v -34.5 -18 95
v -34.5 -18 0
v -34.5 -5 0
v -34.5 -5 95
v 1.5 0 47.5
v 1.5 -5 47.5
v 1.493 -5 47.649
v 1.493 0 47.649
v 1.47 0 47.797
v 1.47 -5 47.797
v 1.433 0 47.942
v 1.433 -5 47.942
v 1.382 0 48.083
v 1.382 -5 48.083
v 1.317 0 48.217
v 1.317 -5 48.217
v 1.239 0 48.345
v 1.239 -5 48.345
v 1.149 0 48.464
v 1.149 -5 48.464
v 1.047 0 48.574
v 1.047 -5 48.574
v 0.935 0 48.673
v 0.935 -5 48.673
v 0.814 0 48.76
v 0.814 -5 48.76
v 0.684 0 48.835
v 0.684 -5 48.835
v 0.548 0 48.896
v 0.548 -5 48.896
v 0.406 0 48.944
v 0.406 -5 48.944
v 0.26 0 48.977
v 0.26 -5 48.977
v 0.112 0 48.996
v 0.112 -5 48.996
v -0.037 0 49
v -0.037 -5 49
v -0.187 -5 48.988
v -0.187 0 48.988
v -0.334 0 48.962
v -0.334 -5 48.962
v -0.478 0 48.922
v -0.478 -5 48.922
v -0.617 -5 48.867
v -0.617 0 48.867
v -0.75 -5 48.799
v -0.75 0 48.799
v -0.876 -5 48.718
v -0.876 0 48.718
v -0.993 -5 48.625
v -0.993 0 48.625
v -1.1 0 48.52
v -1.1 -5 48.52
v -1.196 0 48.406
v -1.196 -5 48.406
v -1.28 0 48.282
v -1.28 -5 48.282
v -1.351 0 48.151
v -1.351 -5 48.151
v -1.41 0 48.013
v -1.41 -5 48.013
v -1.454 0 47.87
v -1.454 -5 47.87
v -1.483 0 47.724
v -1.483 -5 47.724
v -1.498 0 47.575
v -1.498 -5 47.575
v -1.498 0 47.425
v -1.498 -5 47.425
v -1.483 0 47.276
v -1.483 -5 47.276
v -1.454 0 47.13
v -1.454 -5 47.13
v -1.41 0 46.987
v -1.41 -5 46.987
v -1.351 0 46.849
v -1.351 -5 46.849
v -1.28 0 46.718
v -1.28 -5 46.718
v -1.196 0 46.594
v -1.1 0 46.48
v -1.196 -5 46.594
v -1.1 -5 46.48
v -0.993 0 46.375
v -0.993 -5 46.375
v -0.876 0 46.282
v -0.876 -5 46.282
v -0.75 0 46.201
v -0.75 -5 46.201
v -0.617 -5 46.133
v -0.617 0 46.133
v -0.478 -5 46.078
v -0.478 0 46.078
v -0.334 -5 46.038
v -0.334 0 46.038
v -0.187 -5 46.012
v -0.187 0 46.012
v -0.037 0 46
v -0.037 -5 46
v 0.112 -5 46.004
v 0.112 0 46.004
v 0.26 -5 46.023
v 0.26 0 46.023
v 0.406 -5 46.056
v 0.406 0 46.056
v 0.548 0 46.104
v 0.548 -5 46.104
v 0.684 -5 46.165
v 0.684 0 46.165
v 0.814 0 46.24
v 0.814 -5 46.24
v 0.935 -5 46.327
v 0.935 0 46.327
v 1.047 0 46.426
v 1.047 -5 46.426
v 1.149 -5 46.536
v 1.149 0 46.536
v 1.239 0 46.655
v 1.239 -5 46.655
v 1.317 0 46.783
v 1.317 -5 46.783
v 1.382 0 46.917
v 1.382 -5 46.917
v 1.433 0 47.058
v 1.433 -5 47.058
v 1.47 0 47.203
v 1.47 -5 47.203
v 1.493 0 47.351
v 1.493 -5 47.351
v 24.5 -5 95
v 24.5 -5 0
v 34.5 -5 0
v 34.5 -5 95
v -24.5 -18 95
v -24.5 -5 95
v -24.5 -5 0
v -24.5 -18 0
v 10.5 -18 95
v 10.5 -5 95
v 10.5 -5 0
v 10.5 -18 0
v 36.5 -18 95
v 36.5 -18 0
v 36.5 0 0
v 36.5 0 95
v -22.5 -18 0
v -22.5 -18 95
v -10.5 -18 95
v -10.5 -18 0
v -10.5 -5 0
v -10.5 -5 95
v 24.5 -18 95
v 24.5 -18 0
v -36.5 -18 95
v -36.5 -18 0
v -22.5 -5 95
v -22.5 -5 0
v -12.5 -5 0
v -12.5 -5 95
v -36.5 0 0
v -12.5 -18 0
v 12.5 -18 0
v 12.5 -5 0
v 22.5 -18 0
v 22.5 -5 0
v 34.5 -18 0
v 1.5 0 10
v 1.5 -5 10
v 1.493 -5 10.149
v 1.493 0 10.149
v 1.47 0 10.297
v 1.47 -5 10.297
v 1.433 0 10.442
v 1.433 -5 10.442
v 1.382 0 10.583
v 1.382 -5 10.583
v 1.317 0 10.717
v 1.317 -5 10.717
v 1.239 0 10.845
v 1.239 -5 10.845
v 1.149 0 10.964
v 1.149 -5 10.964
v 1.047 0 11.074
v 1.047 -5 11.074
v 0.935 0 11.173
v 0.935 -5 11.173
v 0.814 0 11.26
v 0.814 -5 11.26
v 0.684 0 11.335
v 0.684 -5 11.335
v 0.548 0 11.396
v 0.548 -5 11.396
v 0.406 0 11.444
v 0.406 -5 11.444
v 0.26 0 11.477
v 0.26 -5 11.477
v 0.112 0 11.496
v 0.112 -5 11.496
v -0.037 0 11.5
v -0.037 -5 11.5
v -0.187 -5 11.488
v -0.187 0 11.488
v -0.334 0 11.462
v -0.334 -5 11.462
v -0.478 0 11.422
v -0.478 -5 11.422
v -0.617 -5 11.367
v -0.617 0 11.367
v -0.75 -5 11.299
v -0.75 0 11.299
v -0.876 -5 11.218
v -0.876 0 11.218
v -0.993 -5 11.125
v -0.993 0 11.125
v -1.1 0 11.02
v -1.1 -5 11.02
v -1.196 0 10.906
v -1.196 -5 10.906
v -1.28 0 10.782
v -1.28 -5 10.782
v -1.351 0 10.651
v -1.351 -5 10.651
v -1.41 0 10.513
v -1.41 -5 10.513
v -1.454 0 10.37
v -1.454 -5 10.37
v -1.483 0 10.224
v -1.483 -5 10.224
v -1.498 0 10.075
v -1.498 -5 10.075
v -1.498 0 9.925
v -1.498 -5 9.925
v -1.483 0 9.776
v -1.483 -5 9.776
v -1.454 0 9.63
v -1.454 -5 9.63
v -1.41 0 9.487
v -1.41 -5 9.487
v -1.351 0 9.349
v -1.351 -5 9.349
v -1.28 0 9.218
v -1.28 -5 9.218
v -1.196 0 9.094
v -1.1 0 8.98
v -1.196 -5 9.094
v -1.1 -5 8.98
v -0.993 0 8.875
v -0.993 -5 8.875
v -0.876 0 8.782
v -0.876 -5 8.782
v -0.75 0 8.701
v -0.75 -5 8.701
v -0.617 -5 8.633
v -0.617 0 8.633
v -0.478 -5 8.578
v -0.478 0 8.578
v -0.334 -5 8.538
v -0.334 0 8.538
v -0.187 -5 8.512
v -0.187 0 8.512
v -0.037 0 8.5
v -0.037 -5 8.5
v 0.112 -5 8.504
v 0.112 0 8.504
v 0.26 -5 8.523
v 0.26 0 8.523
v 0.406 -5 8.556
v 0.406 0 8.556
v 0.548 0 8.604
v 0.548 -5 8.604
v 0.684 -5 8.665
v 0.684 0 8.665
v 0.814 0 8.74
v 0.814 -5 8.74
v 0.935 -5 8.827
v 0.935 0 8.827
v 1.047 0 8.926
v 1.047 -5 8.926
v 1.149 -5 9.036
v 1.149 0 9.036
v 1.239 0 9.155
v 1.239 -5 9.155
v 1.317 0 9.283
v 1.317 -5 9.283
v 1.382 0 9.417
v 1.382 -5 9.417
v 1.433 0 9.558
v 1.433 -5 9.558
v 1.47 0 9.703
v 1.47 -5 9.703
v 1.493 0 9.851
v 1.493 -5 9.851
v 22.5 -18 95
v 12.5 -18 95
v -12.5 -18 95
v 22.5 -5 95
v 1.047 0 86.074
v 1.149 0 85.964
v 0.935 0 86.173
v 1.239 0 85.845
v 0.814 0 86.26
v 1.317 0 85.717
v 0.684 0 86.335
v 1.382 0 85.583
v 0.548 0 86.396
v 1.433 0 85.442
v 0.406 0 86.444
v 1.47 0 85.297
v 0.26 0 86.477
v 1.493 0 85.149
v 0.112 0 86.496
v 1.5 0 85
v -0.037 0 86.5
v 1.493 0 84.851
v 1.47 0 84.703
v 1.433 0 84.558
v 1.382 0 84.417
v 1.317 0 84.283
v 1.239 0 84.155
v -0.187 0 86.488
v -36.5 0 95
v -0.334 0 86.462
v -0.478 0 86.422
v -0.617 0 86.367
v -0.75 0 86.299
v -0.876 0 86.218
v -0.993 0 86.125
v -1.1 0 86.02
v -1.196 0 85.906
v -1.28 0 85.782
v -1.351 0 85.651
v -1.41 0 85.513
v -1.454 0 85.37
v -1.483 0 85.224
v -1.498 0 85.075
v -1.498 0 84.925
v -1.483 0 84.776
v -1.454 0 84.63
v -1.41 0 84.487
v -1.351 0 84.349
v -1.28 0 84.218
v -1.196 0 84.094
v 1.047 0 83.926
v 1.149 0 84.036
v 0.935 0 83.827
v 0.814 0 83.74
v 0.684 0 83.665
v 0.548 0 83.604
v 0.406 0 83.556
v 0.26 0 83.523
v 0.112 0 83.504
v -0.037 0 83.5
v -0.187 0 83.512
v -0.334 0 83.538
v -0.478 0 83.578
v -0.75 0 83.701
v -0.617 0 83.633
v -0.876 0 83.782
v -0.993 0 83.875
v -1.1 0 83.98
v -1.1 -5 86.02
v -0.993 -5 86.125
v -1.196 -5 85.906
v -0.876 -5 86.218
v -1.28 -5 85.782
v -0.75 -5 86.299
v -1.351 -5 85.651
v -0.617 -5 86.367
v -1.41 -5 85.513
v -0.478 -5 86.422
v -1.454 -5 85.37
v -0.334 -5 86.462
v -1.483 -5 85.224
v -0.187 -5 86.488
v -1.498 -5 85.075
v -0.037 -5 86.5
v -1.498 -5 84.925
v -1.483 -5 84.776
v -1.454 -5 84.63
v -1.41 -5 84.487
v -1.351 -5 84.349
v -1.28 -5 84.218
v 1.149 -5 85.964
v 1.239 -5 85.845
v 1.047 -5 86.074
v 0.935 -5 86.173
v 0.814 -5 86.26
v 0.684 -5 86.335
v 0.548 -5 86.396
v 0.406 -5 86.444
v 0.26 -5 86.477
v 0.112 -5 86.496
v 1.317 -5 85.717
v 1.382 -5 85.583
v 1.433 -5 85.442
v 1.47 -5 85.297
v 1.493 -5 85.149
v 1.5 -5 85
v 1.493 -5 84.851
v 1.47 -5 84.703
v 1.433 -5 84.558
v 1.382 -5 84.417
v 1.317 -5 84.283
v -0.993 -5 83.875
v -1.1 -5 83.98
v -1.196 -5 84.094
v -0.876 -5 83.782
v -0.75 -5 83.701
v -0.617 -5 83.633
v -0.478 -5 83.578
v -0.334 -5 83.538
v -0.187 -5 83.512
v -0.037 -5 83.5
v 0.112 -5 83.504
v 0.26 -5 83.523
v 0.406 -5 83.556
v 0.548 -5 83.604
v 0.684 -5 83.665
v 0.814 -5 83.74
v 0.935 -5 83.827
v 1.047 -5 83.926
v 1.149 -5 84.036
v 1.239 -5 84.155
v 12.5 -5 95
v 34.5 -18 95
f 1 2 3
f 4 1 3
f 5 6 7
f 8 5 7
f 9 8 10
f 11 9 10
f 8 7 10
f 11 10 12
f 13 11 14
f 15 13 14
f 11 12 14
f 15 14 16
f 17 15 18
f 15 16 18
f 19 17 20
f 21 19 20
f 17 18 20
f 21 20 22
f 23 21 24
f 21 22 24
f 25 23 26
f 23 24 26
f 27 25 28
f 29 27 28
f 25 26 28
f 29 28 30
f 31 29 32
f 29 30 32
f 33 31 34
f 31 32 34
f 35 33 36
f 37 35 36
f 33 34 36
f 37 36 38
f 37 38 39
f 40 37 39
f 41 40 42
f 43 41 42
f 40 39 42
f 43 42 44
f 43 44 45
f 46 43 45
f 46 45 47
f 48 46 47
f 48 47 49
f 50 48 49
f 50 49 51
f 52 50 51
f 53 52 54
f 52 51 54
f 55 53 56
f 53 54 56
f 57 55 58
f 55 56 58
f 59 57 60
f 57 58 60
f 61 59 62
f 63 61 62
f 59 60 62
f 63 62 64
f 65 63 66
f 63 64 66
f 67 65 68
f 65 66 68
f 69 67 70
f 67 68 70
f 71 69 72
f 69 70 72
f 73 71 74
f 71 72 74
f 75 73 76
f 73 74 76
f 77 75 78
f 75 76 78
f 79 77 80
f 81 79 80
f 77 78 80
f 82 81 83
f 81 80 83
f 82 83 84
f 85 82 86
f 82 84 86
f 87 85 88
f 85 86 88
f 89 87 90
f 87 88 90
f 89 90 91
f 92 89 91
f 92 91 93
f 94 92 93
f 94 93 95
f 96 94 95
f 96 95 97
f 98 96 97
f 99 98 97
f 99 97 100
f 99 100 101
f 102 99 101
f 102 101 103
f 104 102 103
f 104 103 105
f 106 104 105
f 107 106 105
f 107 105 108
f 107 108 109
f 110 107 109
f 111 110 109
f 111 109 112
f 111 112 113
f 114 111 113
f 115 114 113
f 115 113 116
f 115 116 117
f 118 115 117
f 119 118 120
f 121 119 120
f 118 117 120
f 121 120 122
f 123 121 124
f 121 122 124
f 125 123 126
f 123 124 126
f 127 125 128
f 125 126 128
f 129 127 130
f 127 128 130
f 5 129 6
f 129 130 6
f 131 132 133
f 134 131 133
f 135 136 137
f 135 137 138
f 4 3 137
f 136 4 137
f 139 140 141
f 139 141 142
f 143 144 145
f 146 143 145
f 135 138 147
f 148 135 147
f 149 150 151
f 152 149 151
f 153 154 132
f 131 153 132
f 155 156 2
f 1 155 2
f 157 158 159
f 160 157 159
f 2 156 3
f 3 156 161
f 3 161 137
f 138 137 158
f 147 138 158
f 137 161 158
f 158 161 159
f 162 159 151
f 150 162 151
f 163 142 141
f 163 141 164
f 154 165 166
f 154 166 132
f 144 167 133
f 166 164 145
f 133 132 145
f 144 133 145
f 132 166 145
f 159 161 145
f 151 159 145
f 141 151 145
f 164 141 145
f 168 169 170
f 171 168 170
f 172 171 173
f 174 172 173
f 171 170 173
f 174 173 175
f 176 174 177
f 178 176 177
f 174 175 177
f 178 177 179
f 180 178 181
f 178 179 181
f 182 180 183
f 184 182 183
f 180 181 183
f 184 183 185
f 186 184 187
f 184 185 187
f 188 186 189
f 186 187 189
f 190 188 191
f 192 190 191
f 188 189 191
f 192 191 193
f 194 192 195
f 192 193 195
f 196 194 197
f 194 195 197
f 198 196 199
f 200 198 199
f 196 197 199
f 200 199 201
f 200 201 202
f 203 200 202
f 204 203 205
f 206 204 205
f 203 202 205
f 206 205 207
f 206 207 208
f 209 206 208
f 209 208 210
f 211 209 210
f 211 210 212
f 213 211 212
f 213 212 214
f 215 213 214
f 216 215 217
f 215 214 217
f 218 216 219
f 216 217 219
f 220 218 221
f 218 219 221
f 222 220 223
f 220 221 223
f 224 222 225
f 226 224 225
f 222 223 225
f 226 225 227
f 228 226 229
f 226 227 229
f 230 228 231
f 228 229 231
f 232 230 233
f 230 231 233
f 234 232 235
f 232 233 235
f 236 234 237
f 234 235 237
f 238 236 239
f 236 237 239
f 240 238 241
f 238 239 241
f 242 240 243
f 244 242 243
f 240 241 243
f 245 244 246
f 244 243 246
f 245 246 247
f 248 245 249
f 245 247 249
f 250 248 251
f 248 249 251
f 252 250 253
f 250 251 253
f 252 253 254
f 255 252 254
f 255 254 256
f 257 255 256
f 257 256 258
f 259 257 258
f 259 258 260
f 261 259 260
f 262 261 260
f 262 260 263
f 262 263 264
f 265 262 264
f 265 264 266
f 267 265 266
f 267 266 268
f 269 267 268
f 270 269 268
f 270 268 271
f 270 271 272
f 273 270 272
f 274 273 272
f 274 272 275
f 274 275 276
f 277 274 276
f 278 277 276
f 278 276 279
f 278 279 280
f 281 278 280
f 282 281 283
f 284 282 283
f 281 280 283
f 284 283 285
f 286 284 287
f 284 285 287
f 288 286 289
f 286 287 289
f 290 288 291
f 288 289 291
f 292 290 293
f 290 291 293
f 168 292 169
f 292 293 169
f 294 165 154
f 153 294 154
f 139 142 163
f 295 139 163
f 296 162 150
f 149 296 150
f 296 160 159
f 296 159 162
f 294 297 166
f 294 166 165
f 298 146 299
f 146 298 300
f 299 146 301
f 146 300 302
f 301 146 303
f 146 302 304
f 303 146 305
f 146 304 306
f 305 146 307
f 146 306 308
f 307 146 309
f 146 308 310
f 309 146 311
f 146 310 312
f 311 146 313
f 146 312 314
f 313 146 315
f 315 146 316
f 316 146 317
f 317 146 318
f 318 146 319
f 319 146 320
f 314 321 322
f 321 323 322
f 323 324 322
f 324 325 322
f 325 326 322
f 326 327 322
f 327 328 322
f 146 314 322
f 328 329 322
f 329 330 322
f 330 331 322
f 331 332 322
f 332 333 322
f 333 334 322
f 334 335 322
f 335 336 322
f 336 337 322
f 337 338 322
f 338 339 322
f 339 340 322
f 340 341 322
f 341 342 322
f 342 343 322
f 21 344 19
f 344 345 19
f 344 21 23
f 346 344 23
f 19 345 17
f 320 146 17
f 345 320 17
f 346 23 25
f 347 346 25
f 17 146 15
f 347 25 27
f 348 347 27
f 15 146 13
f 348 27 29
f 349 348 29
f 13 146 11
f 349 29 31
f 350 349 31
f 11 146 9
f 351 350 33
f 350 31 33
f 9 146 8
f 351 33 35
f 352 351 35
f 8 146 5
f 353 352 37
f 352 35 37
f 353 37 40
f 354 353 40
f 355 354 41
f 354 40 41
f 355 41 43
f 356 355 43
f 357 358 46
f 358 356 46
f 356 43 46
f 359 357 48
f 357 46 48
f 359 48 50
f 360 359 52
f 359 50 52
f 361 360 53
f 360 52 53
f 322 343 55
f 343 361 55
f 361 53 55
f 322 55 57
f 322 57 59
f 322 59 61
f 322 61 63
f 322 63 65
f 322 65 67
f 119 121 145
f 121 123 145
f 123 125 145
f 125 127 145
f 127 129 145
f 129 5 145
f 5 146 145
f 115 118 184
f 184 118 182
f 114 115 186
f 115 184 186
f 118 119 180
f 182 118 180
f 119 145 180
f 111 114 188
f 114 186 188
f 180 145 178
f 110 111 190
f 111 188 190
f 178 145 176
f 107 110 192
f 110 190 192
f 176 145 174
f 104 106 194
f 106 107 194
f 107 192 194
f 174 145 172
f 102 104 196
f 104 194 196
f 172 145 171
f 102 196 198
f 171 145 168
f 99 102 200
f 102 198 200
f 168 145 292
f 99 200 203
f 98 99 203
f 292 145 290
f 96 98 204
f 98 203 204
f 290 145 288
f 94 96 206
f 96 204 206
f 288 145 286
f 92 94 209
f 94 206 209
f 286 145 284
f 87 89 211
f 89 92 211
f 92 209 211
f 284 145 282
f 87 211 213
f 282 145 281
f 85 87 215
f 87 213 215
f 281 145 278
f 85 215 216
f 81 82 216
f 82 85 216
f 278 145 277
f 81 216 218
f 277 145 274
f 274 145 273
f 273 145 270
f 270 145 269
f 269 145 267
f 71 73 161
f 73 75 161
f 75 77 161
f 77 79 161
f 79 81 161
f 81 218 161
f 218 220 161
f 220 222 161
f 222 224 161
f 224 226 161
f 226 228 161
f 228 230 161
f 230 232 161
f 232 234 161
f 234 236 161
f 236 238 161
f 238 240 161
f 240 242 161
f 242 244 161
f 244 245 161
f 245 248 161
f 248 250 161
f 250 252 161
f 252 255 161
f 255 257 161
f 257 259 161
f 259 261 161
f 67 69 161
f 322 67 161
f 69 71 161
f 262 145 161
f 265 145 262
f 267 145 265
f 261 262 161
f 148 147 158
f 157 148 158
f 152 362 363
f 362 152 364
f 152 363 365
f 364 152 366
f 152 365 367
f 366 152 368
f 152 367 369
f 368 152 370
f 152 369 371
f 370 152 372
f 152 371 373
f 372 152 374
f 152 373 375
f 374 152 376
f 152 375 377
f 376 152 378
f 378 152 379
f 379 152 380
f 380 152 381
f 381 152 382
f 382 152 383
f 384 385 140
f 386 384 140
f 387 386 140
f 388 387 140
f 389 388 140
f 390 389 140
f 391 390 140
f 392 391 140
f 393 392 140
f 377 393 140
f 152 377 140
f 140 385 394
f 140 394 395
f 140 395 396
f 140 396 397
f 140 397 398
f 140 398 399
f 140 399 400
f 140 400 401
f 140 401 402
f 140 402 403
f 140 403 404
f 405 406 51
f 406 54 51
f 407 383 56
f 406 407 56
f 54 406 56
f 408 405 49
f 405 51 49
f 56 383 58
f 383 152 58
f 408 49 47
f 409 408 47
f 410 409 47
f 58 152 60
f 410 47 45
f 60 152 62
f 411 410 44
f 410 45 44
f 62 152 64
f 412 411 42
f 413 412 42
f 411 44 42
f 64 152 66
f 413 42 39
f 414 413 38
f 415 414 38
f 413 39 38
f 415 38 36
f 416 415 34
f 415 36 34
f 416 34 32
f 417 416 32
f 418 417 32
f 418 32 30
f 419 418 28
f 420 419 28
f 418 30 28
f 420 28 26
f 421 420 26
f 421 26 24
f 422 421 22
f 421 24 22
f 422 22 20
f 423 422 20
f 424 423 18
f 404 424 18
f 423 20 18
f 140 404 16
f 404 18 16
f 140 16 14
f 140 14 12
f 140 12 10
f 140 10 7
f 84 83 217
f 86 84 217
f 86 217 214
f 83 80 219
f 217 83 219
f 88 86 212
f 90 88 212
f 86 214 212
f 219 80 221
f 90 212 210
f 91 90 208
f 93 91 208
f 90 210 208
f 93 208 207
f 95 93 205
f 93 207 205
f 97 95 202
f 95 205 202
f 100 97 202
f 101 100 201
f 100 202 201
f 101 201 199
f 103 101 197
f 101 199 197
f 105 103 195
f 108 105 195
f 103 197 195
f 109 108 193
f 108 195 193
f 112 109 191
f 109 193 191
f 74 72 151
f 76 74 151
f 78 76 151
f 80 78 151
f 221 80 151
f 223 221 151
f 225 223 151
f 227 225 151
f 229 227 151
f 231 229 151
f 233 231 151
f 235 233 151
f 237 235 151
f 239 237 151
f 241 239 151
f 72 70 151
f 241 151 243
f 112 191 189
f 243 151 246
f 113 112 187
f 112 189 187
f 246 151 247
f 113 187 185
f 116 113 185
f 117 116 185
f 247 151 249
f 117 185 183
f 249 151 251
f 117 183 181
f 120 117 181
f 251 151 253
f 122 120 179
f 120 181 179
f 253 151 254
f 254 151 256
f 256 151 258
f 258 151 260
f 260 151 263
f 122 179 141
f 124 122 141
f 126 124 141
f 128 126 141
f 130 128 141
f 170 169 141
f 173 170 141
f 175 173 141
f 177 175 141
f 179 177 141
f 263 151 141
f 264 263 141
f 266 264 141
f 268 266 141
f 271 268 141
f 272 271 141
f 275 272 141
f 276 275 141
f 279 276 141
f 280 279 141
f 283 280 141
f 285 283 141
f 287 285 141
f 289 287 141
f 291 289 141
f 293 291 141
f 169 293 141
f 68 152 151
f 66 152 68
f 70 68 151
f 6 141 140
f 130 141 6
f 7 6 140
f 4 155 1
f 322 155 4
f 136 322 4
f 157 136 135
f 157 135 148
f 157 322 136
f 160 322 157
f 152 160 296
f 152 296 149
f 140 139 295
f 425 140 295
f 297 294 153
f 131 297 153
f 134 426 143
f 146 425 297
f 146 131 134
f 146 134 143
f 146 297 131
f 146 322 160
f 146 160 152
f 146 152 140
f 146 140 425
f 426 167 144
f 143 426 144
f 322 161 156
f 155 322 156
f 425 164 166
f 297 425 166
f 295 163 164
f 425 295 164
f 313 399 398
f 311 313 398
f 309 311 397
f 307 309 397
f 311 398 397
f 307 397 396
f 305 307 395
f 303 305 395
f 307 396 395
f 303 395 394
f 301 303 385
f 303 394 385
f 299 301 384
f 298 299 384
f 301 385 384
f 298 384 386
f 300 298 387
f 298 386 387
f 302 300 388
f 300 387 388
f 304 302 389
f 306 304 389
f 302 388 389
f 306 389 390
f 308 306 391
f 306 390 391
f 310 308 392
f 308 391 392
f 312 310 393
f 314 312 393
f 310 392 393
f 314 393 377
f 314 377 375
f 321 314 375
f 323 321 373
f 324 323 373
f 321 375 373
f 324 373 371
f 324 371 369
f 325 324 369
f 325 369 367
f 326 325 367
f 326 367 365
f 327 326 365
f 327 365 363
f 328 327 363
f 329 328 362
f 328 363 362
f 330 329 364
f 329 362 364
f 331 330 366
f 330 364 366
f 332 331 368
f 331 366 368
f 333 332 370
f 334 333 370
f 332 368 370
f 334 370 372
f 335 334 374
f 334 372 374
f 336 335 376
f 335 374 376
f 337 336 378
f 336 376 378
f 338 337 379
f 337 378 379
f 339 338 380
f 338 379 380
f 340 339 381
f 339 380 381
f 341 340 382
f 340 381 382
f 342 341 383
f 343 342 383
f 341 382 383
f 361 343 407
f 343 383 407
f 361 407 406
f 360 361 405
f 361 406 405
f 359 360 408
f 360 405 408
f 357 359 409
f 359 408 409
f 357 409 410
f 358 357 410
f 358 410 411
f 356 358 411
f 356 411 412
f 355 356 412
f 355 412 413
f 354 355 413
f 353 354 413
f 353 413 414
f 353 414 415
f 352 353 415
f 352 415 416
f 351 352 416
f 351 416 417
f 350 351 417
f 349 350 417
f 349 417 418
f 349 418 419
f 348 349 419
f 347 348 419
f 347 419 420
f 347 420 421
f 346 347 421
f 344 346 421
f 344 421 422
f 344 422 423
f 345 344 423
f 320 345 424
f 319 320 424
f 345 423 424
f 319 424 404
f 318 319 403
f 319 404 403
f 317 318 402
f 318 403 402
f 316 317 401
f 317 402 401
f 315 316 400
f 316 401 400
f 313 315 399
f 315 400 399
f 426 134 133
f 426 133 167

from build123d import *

# Parameters (mm, degrees)
F1_DEPTH = 95
F2_R     = 1.5
F3_DEPTH = 5


with BuildPart() as f1:
    # F0 (on Top) → F1 (new body)
    with BuildSketch(Plane.XY):
        Polygon((36.5, 0), (0, 0), (-36.5, 0), (-36.5, -18), (-34.5, -18), (-34.5, -5), (-24.5, -5), (-24.5, -18), (-22.5, -18), (-22.5, -5), (-12.5, -5), (-12.5, -18), (-10.5, -18), (-10.5, -5), (0, -5), (10.5, -5), (10.5, -18), (12.5, -18), (12.5, -5), (22.5, -5), (22.5, -18), (24.5, -18), (24.5, -5), (34.5, -5), (34.5, -18), (36.5, -18), align=None)
    extrude(amount=F1_DEPTH)

    # F2 (on face) → F3 (cut, through all)
    with BuildSketch(Plane.XZ.offset(5)):
        with Locations((0, 85)):
            Circle(F2_R)
        with Locations((0, 47.5)):
            Circle(F2_R)
        with Locations((0, 10)):
            Circle(F2_R)
    extrude(amount=-F3_DEPTH, mode=Mode.SUBTRACT)


solid = f1.part
